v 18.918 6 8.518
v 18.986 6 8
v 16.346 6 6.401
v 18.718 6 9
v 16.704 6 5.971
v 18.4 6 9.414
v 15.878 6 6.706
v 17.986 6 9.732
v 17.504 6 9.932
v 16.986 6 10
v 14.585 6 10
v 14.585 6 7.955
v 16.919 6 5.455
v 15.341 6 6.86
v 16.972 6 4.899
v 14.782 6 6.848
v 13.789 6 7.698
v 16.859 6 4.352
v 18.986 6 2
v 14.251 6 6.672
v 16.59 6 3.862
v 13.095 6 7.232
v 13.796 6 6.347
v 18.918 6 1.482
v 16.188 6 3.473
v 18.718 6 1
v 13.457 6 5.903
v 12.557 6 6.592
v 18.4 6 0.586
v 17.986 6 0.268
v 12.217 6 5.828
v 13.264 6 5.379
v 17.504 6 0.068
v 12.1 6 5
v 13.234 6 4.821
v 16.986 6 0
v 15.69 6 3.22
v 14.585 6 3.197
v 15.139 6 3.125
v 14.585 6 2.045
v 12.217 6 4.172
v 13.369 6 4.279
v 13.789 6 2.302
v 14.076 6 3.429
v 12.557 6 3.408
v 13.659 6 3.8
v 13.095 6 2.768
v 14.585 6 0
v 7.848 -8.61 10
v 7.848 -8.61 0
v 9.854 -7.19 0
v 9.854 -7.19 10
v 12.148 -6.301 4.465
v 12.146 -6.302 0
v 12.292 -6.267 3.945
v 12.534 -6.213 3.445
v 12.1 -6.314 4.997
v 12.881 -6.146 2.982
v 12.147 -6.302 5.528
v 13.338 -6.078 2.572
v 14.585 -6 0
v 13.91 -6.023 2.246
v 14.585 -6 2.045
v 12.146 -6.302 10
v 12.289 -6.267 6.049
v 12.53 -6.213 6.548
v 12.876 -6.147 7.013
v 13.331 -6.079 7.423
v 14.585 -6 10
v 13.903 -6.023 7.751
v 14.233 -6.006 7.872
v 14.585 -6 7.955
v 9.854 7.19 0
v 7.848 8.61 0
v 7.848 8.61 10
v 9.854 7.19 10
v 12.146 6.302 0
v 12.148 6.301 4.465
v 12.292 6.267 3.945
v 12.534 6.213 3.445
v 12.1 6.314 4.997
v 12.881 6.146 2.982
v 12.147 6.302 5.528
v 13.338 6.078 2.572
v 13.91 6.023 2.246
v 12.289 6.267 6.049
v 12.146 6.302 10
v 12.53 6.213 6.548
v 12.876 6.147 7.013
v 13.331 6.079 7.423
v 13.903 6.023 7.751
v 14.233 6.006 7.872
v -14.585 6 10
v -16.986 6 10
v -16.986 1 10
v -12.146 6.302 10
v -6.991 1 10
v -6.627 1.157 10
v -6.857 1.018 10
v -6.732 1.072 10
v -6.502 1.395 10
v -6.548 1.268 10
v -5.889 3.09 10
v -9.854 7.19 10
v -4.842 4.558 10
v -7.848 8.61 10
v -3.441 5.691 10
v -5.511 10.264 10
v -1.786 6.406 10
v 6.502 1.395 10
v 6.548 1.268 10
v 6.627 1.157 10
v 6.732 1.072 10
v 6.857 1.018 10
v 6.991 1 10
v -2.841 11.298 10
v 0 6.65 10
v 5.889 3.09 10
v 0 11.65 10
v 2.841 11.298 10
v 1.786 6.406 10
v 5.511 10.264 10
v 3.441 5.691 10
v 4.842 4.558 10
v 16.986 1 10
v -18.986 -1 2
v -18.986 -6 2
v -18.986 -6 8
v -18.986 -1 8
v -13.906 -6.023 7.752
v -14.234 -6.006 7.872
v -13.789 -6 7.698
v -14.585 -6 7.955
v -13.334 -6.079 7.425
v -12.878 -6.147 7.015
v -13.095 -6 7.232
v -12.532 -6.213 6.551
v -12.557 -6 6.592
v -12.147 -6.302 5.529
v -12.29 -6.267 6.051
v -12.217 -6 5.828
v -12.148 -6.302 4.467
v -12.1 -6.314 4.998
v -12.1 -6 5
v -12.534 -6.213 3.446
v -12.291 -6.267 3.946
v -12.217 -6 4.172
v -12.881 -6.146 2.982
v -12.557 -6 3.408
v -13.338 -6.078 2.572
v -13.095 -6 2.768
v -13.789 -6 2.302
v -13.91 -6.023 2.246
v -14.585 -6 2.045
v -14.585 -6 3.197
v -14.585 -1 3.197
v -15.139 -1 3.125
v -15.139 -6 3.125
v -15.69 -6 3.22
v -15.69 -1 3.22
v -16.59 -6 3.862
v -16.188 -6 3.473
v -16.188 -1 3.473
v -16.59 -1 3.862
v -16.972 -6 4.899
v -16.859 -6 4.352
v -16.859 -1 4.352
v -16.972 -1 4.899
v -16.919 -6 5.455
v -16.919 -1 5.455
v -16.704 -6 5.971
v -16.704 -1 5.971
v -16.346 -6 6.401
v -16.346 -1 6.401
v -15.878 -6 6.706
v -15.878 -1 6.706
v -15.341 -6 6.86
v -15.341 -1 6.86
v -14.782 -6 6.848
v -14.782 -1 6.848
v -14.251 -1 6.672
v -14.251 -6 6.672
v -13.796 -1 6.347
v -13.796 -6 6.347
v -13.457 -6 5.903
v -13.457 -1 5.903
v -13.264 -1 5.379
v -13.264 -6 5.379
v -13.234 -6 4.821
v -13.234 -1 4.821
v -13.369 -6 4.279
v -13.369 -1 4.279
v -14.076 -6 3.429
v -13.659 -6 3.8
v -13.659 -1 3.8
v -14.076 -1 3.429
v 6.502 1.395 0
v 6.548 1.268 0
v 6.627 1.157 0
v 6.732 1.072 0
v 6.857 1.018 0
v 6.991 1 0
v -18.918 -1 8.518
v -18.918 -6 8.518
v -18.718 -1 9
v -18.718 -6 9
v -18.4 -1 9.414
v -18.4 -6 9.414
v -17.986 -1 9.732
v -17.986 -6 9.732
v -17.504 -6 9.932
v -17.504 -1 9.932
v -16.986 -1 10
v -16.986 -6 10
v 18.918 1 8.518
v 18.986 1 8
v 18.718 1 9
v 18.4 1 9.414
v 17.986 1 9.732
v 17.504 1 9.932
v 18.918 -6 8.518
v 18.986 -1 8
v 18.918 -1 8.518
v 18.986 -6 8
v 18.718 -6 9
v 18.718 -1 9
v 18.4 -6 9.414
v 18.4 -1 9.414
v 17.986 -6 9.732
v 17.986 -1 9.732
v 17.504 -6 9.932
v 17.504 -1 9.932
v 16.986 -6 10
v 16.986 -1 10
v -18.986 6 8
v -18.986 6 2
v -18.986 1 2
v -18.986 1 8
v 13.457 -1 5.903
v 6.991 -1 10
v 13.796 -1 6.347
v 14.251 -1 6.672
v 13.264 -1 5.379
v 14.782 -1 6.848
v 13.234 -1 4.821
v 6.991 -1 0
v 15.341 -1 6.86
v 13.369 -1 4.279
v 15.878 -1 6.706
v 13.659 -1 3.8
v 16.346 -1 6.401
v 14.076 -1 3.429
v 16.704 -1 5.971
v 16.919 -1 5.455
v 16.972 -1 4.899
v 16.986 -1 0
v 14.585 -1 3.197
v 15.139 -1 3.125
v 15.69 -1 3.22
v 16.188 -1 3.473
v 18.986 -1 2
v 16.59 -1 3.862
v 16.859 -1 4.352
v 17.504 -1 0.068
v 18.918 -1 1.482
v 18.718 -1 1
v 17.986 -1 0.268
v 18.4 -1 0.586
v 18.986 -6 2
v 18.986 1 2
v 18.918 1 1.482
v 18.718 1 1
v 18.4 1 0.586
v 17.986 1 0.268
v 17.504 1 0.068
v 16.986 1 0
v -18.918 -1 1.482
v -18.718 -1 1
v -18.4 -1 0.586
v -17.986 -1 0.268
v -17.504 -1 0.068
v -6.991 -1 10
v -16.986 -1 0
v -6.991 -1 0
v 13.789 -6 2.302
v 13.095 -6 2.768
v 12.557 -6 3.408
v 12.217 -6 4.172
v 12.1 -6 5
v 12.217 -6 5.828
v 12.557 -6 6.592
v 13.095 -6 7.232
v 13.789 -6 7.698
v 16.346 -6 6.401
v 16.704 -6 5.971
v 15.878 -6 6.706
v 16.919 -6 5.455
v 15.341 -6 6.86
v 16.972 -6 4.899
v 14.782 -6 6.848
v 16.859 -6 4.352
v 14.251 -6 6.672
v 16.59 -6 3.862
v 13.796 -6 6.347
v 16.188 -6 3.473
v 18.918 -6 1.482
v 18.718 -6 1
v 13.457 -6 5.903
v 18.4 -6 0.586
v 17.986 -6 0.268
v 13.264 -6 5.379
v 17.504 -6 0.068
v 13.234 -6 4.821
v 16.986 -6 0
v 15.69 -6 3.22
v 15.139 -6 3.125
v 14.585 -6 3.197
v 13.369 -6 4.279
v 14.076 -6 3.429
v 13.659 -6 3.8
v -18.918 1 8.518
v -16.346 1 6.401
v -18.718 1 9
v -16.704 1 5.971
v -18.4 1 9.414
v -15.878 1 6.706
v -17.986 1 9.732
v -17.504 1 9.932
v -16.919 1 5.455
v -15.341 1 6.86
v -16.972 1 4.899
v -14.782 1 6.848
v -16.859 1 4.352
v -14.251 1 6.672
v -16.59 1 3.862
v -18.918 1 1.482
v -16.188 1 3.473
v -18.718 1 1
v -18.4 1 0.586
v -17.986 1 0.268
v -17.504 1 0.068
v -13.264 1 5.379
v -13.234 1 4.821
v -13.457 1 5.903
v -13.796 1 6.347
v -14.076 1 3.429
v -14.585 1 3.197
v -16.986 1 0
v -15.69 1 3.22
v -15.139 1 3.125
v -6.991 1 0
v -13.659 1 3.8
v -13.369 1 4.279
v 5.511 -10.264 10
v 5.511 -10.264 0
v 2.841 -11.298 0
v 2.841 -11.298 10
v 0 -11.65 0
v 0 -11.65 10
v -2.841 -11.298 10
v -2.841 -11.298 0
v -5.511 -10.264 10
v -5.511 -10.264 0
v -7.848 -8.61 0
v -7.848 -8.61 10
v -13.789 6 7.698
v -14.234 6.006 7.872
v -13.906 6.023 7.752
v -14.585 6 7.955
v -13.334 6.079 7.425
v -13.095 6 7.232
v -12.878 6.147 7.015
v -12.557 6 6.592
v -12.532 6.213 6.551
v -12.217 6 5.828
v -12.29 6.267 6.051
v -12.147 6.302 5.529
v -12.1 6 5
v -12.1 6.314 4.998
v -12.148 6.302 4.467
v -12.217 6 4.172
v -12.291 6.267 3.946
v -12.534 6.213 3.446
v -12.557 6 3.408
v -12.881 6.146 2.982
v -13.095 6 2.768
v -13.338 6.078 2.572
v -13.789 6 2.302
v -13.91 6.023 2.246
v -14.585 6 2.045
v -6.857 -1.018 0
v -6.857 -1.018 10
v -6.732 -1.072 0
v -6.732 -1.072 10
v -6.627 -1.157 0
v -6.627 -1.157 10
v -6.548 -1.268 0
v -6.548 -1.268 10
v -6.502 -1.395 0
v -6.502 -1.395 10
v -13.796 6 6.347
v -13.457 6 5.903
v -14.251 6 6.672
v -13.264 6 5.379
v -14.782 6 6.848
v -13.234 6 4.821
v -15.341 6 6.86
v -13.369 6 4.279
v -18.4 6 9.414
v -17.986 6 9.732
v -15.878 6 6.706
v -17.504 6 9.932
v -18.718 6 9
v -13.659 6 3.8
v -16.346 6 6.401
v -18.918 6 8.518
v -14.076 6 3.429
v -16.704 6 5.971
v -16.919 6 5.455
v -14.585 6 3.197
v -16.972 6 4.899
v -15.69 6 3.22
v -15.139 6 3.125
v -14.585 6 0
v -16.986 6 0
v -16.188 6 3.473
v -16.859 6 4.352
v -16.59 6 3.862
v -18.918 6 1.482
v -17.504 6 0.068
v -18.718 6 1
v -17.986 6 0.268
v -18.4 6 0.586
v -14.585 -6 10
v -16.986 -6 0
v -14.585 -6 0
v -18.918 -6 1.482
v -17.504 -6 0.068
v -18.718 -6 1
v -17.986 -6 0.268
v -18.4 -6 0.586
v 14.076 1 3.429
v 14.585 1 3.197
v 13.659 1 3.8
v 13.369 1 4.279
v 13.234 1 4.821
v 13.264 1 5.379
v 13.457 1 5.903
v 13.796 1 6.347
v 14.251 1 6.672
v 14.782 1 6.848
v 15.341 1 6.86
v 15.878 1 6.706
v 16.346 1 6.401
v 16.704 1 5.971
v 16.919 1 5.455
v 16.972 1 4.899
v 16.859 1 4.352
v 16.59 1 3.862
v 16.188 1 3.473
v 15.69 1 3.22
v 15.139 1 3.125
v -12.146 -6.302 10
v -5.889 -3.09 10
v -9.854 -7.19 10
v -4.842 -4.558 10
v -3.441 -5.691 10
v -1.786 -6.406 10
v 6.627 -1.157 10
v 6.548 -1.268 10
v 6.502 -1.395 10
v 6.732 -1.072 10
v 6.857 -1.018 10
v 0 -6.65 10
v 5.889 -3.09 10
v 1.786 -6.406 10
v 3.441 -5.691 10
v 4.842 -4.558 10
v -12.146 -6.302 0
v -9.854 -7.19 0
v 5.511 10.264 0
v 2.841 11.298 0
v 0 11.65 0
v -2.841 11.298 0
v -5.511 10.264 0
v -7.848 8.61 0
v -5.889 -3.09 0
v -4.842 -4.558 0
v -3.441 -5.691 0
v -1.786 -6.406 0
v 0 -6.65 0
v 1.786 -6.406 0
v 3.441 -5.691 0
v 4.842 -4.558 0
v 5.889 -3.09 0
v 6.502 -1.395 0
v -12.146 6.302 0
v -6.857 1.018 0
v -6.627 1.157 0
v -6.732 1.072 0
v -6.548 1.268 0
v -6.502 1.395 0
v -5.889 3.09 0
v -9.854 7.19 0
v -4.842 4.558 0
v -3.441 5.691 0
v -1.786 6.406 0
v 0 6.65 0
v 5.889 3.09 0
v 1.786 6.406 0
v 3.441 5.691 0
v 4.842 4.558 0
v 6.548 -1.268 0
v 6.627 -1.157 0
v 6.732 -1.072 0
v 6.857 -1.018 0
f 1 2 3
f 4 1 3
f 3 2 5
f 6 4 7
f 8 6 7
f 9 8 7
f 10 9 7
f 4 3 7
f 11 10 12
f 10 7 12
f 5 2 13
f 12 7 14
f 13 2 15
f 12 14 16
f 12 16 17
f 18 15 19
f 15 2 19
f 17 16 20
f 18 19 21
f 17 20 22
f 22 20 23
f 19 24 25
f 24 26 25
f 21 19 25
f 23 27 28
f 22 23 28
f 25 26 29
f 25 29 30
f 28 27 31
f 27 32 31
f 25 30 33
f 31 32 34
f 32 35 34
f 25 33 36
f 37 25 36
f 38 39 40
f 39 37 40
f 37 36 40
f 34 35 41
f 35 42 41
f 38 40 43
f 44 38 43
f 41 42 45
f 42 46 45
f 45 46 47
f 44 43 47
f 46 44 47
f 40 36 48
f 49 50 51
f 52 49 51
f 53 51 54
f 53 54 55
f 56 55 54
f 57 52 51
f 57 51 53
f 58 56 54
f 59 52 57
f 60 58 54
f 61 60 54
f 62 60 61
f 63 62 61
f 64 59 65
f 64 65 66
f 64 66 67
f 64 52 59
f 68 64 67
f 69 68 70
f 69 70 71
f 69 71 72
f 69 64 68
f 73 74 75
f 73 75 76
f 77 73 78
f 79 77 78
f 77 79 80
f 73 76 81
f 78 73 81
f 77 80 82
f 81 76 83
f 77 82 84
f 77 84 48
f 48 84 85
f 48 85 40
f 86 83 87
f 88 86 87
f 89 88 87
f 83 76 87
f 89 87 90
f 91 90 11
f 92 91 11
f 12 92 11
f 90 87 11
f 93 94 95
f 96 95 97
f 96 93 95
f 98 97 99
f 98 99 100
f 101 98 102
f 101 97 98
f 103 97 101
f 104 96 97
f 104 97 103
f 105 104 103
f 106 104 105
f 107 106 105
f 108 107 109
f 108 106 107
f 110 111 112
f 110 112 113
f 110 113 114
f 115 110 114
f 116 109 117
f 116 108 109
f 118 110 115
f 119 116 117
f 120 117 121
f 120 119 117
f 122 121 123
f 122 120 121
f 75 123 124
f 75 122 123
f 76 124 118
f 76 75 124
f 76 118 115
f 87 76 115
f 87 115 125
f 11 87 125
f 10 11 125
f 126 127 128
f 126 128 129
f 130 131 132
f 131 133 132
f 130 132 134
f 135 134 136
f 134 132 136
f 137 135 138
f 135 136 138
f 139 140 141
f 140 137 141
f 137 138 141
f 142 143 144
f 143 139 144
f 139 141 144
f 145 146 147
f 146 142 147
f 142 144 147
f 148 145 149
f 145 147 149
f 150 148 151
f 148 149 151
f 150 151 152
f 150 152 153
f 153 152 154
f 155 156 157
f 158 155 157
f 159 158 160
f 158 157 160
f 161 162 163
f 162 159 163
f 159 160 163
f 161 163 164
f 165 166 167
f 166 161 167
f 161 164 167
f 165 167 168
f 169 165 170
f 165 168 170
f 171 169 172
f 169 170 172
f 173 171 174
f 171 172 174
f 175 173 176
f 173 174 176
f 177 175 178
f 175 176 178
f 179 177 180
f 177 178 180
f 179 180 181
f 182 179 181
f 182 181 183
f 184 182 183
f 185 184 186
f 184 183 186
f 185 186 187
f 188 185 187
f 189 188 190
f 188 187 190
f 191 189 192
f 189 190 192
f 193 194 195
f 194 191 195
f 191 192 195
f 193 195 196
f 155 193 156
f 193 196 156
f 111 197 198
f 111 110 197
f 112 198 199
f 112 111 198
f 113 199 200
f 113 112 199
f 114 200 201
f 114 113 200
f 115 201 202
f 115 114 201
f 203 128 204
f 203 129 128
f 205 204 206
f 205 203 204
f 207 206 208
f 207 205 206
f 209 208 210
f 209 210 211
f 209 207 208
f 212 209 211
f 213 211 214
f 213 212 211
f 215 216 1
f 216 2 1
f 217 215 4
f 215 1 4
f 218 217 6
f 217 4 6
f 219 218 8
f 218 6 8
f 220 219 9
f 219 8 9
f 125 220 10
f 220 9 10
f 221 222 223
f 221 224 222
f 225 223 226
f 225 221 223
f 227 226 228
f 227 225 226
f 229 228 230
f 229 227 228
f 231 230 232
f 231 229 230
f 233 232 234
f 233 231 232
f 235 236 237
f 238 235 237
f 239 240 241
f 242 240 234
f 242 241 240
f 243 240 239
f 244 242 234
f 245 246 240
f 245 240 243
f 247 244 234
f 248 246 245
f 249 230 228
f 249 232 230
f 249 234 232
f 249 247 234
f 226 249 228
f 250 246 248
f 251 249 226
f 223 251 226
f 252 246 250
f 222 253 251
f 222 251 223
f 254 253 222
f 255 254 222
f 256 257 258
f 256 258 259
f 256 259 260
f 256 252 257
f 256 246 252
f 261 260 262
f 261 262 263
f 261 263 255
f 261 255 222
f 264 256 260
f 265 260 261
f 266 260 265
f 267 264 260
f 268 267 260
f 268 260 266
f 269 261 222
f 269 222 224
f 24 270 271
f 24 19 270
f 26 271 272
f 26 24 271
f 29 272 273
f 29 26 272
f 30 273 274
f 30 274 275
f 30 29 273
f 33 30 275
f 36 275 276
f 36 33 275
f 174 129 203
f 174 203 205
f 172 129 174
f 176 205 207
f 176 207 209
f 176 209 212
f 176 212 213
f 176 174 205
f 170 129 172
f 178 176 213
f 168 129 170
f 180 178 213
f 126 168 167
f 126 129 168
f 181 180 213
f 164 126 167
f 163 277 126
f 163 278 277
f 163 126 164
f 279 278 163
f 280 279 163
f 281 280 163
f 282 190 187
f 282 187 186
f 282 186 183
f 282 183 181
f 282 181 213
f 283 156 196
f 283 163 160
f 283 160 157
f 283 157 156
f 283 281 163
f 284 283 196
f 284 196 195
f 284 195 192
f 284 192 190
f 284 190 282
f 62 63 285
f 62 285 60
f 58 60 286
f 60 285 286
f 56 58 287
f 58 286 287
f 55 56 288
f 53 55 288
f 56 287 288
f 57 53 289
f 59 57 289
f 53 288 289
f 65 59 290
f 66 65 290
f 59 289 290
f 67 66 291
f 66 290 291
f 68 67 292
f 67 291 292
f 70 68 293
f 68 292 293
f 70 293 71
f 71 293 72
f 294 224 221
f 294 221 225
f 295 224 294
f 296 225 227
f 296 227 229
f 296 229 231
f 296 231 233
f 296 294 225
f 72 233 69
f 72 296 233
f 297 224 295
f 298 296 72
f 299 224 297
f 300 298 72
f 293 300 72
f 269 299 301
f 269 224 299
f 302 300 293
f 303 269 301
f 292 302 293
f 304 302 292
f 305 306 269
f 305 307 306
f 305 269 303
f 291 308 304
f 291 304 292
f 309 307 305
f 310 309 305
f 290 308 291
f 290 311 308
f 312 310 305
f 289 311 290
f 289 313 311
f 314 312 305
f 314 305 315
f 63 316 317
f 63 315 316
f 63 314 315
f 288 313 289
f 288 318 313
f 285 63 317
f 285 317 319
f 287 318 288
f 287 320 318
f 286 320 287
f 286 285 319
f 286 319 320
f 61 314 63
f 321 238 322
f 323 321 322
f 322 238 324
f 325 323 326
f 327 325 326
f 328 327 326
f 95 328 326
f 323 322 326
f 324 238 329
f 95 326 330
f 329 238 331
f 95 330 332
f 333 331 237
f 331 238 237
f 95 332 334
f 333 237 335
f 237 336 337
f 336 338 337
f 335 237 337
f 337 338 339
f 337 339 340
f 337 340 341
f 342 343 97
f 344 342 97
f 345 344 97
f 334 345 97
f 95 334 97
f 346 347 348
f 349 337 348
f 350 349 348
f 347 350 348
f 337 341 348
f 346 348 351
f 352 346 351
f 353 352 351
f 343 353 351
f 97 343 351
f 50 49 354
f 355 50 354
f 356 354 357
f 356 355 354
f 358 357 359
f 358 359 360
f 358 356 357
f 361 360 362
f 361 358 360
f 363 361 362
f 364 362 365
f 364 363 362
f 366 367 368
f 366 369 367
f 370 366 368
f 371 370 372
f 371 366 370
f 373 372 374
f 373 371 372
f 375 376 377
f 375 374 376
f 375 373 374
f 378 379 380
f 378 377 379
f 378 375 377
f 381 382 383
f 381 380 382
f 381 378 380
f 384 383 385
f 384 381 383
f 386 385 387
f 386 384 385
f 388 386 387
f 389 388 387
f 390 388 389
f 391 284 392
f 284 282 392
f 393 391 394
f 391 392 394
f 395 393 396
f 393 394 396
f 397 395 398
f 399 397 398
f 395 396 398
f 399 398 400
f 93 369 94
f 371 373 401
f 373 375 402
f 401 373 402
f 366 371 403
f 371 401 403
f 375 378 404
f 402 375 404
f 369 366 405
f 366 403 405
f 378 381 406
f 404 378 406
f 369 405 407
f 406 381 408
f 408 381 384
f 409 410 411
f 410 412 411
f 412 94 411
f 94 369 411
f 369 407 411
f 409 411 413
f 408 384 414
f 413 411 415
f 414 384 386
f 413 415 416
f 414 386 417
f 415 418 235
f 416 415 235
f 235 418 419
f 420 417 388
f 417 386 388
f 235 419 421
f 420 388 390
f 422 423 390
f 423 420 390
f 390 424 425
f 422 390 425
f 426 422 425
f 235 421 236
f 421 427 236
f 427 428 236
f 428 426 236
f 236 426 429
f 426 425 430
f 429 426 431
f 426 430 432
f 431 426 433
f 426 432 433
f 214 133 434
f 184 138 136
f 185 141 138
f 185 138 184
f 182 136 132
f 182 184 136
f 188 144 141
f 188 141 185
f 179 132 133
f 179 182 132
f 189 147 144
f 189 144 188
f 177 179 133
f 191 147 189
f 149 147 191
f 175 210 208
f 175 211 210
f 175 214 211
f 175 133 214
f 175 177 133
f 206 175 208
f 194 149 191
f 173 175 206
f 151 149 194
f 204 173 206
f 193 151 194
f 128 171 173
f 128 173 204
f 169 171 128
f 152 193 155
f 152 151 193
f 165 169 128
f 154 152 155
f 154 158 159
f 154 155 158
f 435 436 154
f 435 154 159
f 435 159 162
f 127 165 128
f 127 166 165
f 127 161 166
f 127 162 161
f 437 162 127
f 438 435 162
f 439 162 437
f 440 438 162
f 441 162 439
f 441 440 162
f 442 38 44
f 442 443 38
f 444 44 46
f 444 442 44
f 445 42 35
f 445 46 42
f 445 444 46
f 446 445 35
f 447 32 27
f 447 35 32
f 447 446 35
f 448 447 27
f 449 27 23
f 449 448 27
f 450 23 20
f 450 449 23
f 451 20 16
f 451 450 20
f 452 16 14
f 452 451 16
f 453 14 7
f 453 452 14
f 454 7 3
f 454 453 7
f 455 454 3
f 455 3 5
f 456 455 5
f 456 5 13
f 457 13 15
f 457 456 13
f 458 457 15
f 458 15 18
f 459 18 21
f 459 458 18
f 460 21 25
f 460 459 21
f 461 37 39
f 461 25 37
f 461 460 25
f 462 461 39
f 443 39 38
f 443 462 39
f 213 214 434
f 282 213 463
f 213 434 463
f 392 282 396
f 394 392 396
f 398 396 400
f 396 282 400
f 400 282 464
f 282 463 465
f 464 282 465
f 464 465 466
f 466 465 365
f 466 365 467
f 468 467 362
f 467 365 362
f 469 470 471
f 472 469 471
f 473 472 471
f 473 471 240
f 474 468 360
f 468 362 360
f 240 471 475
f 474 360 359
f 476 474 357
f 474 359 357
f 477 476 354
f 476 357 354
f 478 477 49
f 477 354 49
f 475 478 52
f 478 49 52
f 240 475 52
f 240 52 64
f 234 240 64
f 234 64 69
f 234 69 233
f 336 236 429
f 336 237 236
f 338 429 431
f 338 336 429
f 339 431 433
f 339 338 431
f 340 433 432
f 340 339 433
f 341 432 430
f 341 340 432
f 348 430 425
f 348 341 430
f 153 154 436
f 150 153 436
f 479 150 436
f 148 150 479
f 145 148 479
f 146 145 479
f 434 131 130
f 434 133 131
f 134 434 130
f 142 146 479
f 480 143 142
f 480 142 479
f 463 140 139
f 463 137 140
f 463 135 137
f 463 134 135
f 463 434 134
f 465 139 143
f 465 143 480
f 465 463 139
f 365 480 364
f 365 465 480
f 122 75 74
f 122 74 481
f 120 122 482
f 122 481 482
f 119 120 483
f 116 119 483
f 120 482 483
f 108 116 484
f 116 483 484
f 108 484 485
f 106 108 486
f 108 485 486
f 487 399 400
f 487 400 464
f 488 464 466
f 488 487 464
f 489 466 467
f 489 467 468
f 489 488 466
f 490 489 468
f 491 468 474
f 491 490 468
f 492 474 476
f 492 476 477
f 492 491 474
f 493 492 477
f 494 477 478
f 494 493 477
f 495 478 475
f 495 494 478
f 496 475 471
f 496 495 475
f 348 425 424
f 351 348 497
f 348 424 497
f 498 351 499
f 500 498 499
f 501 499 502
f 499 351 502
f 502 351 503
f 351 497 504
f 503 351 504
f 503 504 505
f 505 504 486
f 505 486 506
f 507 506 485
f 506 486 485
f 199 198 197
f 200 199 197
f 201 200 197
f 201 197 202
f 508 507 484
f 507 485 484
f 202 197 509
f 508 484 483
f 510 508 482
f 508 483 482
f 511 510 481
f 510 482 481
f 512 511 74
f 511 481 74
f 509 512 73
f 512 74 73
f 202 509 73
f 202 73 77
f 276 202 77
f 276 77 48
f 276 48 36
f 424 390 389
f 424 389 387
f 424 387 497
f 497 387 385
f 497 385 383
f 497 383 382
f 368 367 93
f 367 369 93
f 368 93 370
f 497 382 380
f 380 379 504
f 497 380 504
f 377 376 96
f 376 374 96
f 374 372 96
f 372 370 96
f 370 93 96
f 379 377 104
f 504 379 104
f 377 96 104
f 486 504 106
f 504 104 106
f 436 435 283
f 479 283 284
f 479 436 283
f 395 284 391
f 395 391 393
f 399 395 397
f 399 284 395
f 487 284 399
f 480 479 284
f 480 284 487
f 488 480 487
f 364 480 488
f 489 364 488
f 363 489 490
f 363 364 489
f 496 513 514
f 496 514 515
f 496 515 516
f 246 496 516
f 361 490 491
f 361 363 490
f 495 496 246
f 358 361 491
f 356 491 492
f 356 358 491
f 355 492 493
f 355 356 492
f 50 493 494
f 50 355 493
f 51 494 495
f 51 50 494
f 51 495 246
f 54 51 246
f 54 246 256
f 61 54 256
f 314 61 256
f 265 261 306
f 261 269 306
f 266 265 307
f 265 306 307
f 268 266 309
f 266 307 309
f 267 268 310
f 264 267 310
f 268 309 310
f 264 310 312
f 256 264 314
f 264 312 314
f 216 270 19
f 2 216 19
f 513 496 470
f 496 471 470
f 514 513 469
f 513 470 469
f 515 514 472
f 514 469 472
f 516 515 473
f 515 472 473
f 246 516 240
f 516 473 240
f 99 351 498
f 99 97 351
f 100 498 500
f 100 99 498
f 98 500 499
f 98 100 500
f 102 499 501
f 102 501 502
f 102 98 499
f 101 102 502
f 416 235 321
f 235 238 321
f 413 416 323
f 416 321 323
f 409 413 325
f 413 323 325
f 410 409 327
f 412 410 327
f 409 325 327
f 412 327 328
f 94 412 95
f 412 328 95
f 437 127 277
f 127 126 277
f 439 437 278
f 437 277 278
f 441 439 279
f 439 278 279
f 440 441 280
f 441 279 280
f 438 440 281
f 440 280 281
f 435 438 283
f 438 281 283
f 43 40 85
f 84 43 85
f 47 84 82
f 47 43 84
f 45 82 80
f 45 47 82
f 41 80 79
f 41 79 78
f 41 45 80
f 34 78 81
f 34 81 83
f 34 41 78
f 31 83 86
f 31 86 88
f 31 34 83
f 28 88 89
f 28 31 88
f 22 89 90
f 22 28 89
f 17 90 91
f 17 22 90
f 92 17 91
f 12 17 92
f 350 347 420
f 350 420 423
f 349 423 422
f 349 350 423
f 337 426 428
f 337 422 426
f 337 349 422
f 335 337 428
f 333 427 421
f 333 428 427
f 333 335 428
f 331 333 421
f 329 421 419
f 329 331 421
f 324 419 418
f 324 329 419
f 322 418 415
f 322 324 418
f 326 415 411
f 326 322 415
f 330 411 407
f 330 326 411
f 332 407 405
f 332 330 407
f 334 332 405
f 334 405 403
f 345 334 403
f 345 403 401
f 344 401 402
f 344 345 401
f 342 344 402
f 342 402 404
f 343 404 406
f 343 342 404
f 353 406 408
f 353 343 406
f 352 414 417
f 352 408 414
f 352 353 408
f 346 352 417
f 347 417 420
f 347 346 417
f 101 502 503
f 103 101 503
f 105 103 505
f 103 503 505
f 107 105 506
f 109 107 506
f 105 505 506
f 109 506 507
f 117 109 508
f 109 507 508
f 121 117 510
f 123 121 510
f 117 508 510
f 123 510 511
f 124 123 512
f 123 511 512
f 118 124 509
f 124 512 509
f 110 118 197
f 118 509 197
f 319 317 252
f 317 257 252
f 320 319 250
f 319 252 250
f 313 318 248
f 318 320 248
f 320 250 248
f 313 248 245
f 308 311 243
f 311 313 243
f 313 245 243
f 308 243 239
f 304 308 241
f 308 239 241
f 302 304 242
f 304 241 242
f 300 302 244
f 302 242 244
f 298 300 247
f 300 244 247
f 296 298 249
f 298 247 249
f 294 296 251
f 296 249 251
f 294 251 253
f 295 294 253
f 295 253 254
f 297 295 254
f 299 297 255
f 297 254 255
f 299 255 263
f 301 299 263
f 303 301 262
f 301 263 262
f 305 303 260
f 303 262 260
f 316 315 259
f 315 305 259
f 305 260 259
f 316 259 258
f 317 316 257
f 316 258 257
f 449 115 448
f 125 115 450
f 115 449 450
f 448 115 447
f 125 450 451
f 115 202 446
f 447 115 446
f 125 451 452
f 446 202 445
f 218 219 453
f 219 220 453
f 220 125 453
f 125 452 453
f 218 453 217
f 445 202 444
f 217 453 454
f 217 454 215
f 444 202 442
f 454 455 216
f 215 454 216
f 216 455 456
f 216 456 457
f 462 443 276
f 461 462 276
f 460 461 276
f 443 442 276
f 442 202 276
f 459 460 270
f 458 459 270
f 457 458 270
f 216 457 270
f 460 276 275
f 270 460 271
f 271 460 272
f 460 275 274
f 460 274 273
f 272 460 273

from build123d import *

# Parameters (mm, degrees)
BOSS_EXTRUDE1_DEPTH = 10
FILLET1_R           = 2
FILLET3_R           = 0.5
FILLET4_R           = 10
SKETCH2_R           = 1.875
CUT_EXTRUDE1_DEPTH  = 25.417106227
CUT_EXTRUDE2_START  = 6
SKETCH3_R           = 3
CUT_EXTRUDE2_DEPTH  = 10


with BuildPart() as part:
    # Sketch1 → Boss-Extrude1 (new body)
    with BuildSketch(Plane.XY):
        with BuildLine():
            Line((-18.986115361, 1), (-6.5743821, 1))
            ThreePointArc((-6.5743821, 1), (0, 6.65), (6.5743821, 1))
            Line((6.5743821, 1), (18.986115361, 1))
            Line((18.986115361, 1), (18.986115361, 6))
            Line((18.986115361, 6), (9.986115361, 6))
            ThreePointArc((9.986115361, 6), (0, 11.65), (-9.986115361, 6))
            Line((-9.986115361, 6), (-18.986115361, 6))
            Line((-18.986115361, 6), (-18.986115361, 1))
        make_face()
    extrude(amount=BOSS_EXTRUDE1_DEPTH)

    # Fillet1
    fillet1_edges = [part.edges().sort_by_distance(p)[0] for p in [
        (-18.986115361, 3.5, 0),
        (18.986115361, 3.5, 10),
        (-18.986115361, 3.5, 10),
        (18.986115361, 3.5, 0),
    ]]
    fillet(fillet1_edges, radius=FILLET1_R)

    # Fillet3
    fillet3_edges = [part.edges().sort_by_distance(p)[0] for p in [
        (6.5743821, 1, 5),
        (-6.5743821, 1, 5),
    ]]
    fillet(fillet3_edges, radius=FILLET3_R)

    # Fillet4
    fillet4_edges = [part.edges().sort_by_distance(p)[0] for p in [
        (-9.986115361, 6, 5),
        (9.986115361, 6, 5),
    ]]
    fillet(fillet4_edges, radius=FILLET4_R)

    # Sketch2 → Cut-Extrude1 (cut, through all)
    with BuildSketch(Plane(origin=(0, 0, 0), x_dir=(1, 0, 0), z_dir=(0, 1, 0))):
        with Locations(Location((-15.1, -5, 0), (0, 0, 74.058148942))):
            Circle(SKETCH2_R)
        with Locations(Location((15.1, -5, 0), (0, 0, 105.941851061))):
            Circle(SKETCH2_R)
    extrude(amount=CUT_EXTRUDE1_DEPTH, mode=Mode.SUBTRACT)

    # Sketch3 → Cut-Extrude2 (cut)
    with BuildSketch(Plane(origin=(0, 0, 0), x_dir=(1, 0, 0), z_dir=(0, 1, 0)).offset(CUT_EXTRUDE2_START)):
        with Locations((-15.1, -5)):
            Circle(SKETCH3_R)
        with Locations((15.1, -5)):
            Circle(SKETCH3_R)
    extrude(amount=CUT_EXTRUDE2_DEPTH, mode=Mode.SUBTRACT)


with BuildPart() as body_2:
    # Mirror3: mirrored copy
    add(part.part.mirror(Plane.ZX))


solid = Compound([part.part, body_2.part])
